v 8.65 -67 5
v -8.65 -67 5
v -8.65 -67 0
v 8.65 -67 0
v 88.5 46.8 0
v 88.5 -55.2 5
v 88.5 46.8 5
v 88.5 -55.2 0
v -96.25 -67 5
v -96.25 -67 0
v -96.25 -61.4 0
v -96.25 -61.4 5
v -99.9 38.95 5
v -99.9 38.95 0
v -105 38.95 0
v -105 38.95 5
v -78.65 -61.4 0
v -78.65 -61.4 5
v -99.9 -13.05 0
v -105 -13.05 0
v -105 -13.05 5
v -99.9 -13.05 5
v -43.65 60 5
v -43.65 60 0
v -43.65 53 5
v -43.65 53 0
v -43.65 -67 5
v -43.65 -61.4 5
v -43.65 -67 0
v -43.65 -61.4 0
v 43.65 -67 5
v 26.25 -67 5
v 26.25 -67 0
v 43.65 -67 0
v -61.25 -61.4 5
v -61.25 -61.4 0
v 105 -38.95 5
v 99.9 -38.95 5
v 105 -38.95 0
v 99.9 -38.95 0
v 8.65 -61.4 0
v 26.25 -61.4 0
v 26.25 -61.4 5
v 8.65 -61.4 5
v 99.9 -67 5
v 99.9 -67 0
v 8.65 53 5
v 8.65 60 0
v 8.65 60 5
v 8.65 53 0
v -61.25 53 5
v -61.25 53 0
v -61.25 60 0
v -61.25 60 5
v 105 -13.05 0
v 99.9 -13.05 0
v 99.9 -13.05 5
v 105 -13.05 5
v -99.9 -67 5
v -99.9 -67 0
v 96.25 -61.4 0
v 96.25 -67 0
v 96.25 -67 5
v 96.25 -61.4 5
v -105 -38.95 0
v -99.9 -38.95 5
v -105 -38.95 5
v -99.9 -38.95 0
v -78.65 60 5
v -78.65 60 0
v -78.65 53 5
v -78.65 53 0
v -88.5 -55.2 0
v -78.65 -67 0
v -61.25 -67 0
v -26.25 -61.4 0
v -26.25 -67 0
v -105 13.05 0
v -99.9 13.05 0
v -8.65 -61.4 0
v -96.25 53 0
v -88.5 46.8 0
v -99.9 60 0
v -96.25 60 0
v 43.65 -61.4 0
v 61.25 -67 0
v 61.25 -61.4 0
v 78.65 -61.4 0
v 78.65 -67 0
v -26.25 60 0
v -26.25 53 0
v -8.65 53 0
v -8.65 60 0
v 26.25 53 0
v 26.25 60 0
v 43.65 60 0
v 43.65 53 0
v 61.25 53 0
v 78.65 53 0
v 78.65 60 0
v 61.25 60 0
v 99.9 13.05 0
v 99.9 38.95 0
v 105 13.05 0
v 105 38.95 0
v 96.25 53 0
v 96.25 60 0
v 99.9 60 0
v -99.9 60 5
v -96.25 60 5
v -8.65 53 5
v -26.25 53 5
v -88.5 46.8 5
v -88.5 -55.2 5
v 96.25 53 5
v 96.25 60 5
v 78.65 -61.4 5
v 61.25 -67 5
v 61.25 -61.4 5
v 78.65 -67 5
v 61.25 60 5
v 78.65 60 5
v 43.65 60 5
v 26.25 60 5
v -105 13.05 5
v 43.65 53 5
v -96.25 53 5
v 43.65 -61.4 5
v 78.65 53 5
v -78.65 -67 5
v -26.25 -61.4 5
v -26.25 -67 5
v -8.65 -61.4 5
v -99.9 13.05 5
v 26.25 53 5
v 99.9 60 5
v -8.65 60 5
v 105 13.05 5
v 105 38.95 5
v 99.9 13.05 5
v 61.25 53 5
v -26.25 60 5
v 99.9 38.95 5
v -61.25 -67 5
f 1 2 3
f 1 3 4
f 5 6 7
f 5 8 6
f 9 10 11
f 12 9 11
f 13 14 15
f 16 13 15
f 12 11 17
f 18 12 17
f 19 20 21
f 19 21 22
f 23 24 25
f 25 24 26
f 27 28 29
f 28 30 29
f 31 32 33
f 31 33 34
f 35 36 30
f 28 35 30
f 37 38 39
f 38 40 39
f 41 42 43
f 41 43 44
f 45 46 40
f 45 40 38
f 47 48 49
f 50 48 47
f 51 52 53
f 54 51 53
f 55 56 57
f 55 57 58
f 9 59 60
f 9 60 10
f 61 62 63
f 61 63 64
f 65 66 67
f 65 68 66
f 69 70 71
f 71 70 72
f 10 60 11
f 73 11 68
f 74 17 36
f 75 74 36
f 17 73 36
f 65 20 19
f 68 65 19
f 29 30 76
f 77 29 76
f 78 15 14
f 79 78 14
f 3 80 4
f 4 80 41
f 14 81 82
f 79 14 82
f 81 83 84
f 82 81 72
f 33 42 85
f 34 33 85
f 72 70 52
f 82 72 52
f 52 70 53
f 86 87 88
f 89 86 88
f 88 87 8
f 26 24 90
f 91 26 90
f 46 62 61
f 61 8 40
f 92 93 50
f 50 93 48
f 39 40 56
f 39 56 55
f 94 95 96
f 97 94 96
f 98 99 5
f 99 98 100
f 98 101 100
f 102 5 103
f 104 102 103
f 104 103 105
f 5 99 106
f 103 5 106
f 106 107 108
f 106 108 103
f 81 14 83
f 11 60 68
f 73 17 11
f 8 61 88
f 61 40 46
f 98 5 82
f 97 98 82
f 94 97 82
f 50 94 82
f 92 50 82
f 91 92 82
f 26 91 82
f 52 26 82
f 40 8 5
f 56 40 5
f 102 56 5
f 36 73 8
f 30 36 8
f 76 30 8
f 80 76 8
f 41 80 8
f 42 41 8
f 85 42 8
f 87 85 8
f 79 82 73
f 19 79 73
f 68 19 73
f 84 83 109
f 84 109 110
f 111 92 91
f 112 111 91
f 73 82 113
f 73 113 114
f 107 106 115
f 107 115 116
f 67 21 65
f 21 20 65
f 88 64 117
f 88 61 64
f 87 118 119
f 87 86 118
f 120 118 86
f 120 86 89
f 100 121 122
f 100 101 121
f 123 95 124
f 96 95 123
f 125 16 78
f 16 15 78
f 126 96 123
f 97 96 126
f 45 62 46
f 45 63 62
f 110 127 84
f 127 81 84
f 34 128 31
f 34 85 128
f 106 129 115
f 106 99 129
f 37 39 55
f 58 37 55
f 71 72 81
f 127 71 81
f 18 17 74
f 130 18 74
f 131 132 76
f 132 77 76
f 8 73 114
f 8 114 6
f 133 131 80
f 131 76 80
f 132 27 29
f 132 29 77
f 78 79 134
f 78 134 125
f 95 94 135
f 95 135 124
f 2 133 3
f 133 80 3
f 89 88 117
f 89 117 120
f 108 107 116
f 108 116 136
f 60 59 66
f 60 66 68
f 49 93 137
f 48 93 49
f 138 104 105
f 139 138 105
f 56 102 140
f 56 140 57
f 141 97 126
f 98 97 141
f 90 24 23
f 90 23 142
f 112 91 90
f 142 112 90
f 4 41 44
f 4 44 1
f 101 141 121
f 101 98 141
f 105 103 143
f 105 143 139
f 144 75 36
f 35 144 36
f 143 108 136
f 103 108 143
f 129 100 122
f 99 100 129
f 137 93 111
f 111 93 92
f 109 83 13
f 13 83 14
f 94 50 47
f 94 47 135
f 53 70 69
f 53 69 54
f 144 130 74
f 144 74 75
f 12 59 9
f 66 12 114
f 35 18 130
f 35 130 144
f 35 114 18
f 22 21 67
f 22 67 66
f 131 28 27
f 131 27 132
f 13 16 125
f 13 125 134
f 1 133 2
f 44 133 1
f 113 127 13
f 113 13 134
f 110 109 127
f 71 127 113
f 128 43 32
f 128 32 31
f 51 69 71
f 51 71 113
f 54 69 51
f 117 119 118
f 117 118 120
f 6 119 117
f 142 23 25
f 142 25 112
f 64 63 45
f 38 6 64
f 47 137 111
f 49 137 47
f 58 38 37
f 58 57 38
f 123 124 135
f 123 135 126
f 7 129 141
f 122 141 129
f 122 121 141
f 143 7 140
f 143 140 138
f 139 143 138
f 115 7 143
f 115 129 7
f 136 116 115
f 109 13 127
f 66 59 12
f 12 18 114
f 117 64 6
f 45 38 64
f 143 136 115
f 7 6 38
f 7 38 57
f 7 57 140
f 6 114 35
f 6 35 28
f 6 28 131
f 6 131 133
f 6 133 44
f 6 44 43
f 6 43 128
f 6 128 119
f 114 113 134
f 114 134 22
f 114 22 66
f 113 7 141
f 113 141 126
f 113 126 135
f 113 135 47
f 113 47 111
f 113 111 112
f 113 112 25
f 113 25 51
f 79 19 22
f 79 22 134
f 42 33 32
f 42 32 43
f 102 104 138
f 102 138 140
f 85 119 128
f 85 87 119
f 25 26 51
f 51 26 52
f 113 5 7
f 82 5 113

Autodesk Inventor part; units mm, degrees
ref_plane "YZ Plane" through (0, 0, 0) normal (1, 0, 0) x (0, 1, 0)
ref_plane "XZ Plane" through (0, 0, 0) normal (0, 1, 0) x (-1, 0, 0)
ref_plane "XY Plane" through (0, 0, 0) normal (0, 0, 1) x (1, 0, 0)
sketch "Sketch1" plane through (0, 0, 0) normal (0, 0, 1) x (1, 0, 0)
  line L0 (-105, -65) -> (105, -65)
  line L1 (105, -65) -> (105, 65)
  line L2 (105, 65) -> (-105, 65)
  line L3 (-105, 65) -> (-105, -65)
  line L4 (-105, -65) -> (105, 65) construction
  line L5 (105, -65) -> (-105, 65) construction
  line L6 (-88.5, -51) -> (88.5, -51)
  line L7 (88.5, -51) -> (88.5, 51)
  line L8 (88.5, 51) -> (-88.5, 51)
  line L9 (-88.5, 51) -> (-88.5, -51)
  line L10 (-88.5, -51) -> (88.5, 51) construction
  line L11 (88.5, -51) -> (-88.5, 51) construction
  point P0 (0, 0)
  point P1 (-105, 0)
  dimension "d0" = 177
  dimension "d1" = 102
  dimension "d2" = 130
  dimension "d3" = 210
extrude "Extrusion1" add sketch "Sketch1" along normal blind 5 contours L3 L2 L1 L0 | L9 L8 L7 L6
sketch "Sketch2" plane through (0, 0, 5) normal (0, 0, 1) x (1, 0, 0)
  line L0 (-90, -50) -> (-80, -50) construction
  line L1 (-80, -50) -> (-80, 50)
  line L2 (-80, 50) -> (-90, 50) construction
  line L3 (-90, 50) -> (-90, -50)
  line L4 (-90, -50) -> (-80, 50) construction
  line L5 (-80, -50) -> (-90, 50) construction
  line L6 (-105, 65) -> (-105, -65) construction
  line L7 (-88.5, -51) -> (-88.5, 51) construction
  arc A0 (-80, 50) -> (-90, 50) centre (-85, 50) ccw
  arc A1 (-90, -50) -> (-80, -50) centre (-85, -50) ccw
  point P0 (0, 0)
  point P1 (-85, 0)
  dimension "d6" = 10
  dimension "d7" = 100
  dimension "d10" = 20
extrude "Extrusion2" [suppressed]
mirror "Mirror1" [suppressed]
sketch "Sketch3" plane through (0, 0, 0) normal (0, 0, -1) x (-1, 0, 0)
  line L0 (105, -65) -> (99.9, -65)
  line L1 (99.9, -65) -> (99.9, -38.95)
  line L2 (99.9, -38.95) -> (105, -38.95)
  line L3 (105, -38.95) -> (105, -65)
  line L4 (105, -13.05) -> (99.9, -13.05)
  line L5 (99.9, -13.05) -> (99.9, 13.05)
  line L6 (99.9, 13.05) -> (105, 13.05)
  line L7 (105, 13.05) -> (105, -13.05)
  line L8 (105, 65) -> (99.9, 65)
  line L9 (99.9, 65) -> (99.9, 38.95)
  line L10 (99.9, 38.95) -> (105, 38.95)
  line L11 (105, 38.95) -> (105, 65)
  line L12 (-105, -65) -> (-105, 65) projected
  line L13 (-105, 65) -> (-99.9, 65)
  line L14 (-99.9, 65) -> (-99.9, 38.95)
  line L15 (-99.9, 38.95) -> (-105, 38.95)
  line L16 (-105, 38.95) -> (-105, 65)
  line L17 (-105, 13.05) -> (-99.9, 13.05)
  line L18 (-99.9, 13.05) -> (-99.9, -13.05)
  line L19 (-99.9, -13.05) -> (-105, -13.05)
  line L20 (-105, -13.05) -> (-105, 13.05)
  line L21 (-105, -65) -> (-99.9, -65)
  line L22 (-99.9, -65) -> (-99.9, -38.95)
  line L23 (-99.9, -38.95) -> (-105, -38.95)
  line L24 (-105, -38.95) -> (-105, -65)
  line L25 (105, -65) -> (-105, -65) projected
  line L26 (-105, 65) -> (105, 65) projected
  point P0 (0, 0)
  point P1 (-105, 0)
  point P2 (-105, -13.05)
  dimension "d13" = 130
  dimension "d14" = 26.05
  dimension "d15" = 26.1
  dimension "d16" = 5.1
extrude "Extrusion3" cut sketch "Sketch3" against normal blind 10
sketch "Sketch4" plane through (-99.9, -65, 0) normal (0, -1, 0) x (1, 0, 0)
  line L0 (0, 5) -> (0, 0) projected
  line L1 (0, 0) -> (199.8, 0) projected
  line L2 (199.8, 0) -> (199.8, 5) projected
  line L3 (0, 5) -> (199.8, 5) projected
  point P0 (99.9, 0)
extrude "Extrusion4" add sketch "Sketch4" along normal blind 2
sketch "Sketch5" plane through (0, 0, 0) normal (0, 0, -1) x (-1, 0, 0)
  line L0 (99.9, 38.95) -> (99.9, 65) projected
  line L1 (-99.9, 65) -> (99.9, 65) projected
  line L2 (-99.9, 65) -> (-99.9, 38.95) projected
  line L3 (-99.9, 38.95) -> (-105, 38.95) projected
  line L4 (-105, 13.05) -> (-105, 38.95) projected
  line L5 (-105, 13.05) -> (-99.9, 13.05) projected
  line L6 (-99.9, 13.05) -> (-99.9, -13.05) projected
  line L7 (-99.9, -13.05) -> (-105, -13.05) projected
  line L8 (-105, -38.95) -> (-105, -13.05) projected
  line L9 (-105, -38.95) -> (-99.9, -38.95) projected
  line L10 (-99.9, -38.95) -> (-99.9, -67) projected
  line L11 (99.9, -67) -> (99.9, -38.95) projected
  line L12 (99.9, -38.95) -> (105, -38.95) projected
  line L13 (105, -13.05) -> (105, -38.95) projected
  line L14 (105, -13.05) -> (99.9, -13.05) projected
  line L15 (99.9, -13.05) -> (99.9, 13.05) projected
  line L16 (99.9, 13.05) -> (105, 13.05) projected
  line L17 (105, 38.95) -> (105, 13.05) projected
  line L18 (105, 38.95) -> (99.9, 38.95) projected
  line L19 (8.65, -67) -> (26.25, -67)
  line L20 (26.25, -67) -> (26.25, -61.4)
  line L21 (26.25, -61.4) -> (8.65, -61.4)
  line L22 (8.65, -61.4) -> (8.65, -67)
  line L23 (43.65, -61.4) -> (43.65, -67)
  line L24 (43.65, -67) -> (61.25, -67)
  line L25 (61.25, -61.4) -> (43.65, -61.4)
  line L26 (61.25, -67) -> (61.25, -61.4)
  line L27 (78.65, -61.4) -> (78.65, -67)
  line L28 (78.65, -67) -> (96.25, -67)
  line L29 (96.25, -61.4) -> (78.65, -61.4)
  line L30 (96.25, -67) -> (96.25, -61.4)
  line L31 (0, 0) -> (0, -124.7) construction
  line L32 (150.9327, -2.5) -> (-150.9327, -2.5) construction
  line L33 (-8.65, -67) -> (-26.25, -67)
  line L34 (-26.25, -67) -> (-26.25, -61.4)
  line L35 (-26.25, -61.4) -> (-8.65, -61.4)
  line L36 (-8.65, -61.4) -> (-8.65, -67)
  line L37 (-43.65, -61.4) -> (-43.65, -67)
  line L38 (-43.65, -67) -> (-61.25, -67)
  line L39 (-61.25, -61.4) -> (-43.65, -61.4)
  line L40 (-61.25, -67) -> (-61.25, -61.4)
  line L41 (-78.65, -61.4) -> (-78.65, -67)
  line L42 (-78.65, -67) -> (-96.25, -67)
  line L43 (-96.25, -61.4) -> (-78.65, -61.4)
  line L44 (-96.25, -67) -> (-96.25, -61.4)
  line L45 (99.9, -67) -> (-99.9, -67) projected
  line L46 (99.9, -67) -> (-99.9, -67) projected
  point P0 (17.45, -61.4)
  point P1 (52.45, -61.4)
  point P2 (87.45, -61.4)
  point P3 (0, -2.5)
  point P4 (-17.45, -61.4)
  point P5 (-52.45, -61.4)
  point P6 (-87.45, -61.4)
  dimension "d21" = 210
  dimension "d22" = 17.45
  dimension "d23" = 17.6
  dimension "d24" = 5.6
  dimension "d27" = 35
extrude "Extrusion5" cut sketch "Sketch5" against normal through all contours L28 L27 L29 L30 | L24 L23 L25 L26 | L44 L43 L41 L42 | L19 L22 L21 L20 | L40 L39 L37 L38 | L33 L34 L35 L36
sketch "Sketch7" plane through (0, 0, 0) normal (0, 0, -1) x (-1, 0, 0)
  line L0 (99.9, 53) -> (-99.9, 53) construction
  line L1 (8.65, 53) -> (26.25, 53)
  line L2 (26.25, 53) -> (26.25, 65)
  line L3 (26.25, 65) -> (8.65, 65)
  line L4 (8.65, 65) -> (8.65, 53)
  line L5 (43.65, 65) -> (43.65, 53)
  line L6 (43.65, 53) -> (61.25, 53)
  line L7 (61.25, 65) -> (43.65, 65)
  line L8 (61.25, 53) -> (61.25, 65)
  line L9 (78.65, 65) -> (78.65, 53)
  line L10 (78.65, 53) -> (96.25, 53)
  line L11 (96.25, 65) -> (78.65, 65)
  line L12 (96.25, 53) -> (96.25, 65)
  line L13 (99.9, 38.95) -> (99.9, 65) projected
  line L14 (-99.9, 65) -> (-99.9, 38.95) projected
  line L15 (-99.9, 65) -> (99.9, 65) projected
  line L16 (0, 0) -> (0, 28.7468) construction
  line L17 (-43.65, 65) -> (-43.65, 53)
  line L18 (-43.65, 53) -> (-61.25, 53)
  line L19 (-61.25, 65) -> (-43.65, 65)
  line L20 (-61.25, 53) -> (-61.25, 65)
  line L21 (-78.65, 65) -> (-78.65, 53)
  line L22 (-96.25, 65) -> (-78.65, 65)
  line L23 (-78.65, 53) -> (-96.25, 53)
  line L24 (-96.25, 53) -> (-96.25, 65)
  line L25 (-8.65, 53) -> (-26.25, 53)
  line L26 (-26.25, 53) -> (-26.25, 65)
  line L27 (-8.65, 65) -> (-8.65, 53)
  line L28 (-26.25, 65) -> (-8.65, 65)
  point P0 (0, 53)
  point P1 (17.45, 65)
  point P2 (52.45, 65)
  point P3 (87.45, 65)
  point P4 (-52.45, 65)
  point P5 (-87.45, 65)
  point P6 (-17.45, 65)
  dimension "d41" = 17.45
  dimension "d42" = 17.6
  dimension "d44" = 35
  dimension "d47" = 12
extrude "Extrusion7" cut sketch "Sketch7" against normal blind 10
sketch "Sketch8" plane through (0, 0, 0) normal (0, 0, -1) x (-1, 0, 0)
  line L0 (26.25, 65) -> (26.25, 53) projected
  line L1 (26.25, 53) -> (8.65, 53) projected
  line L2 (8.65, 53) -> (8.65, 65) projected
  line L3 (-8.65, 65) -> (8.65, 65) projected
  line L4 (-8.65, 65) -> (-8.65, 53) projected
  line L5 (-8.65, 53) -> (-26.25, 53) projected
  line L6 (-26.25, 53) -> (-26.25, 65) projected
  line L7 (-43.65, 65) -> (-26.25, 65) projected
  line L8 (-43.65, 65) -> (-43.65, 53) projected
  line L9 (-43.65, 53) -> (-61.25, 53) projected
  line L10 (-61.25, 53) -> (-61.25, 65) projected
  line L11 (-78.65, 65) -> (-61.25, 65) projected
  line L12 (-78.65, 65) -> (-78.65, 53) projected
  line L13 (-78.65, 53) -> (-96.25, 53) projected
  line L14 (-96.25, 53) -> (-96.25, 65) projected
  line L15 (-99.9, 65) -> (-96.25, 65) projected
  line L16 (-99.9, 65) -> (-99.9, 38.95) projected
  line L17 (-99.9, 38.95) -> (-105, 38.95) projected
  line L18 (-105, 13.05) -> (-105, 38.95) projected
  line L19 (-105, 13.05) -> (-99.9, 13.05) projected
  line L20 (-99.9, 13.05) -> (-99.9, -13.05) projected
  line L21 (-99.9, -13.05) -> (-105, -13.05) projected
  line L22 (-105, -38.95) -> (-105, -13.05) projected
  line L23 (-105, -38.95) -> (-99.9, -38.95) projected
  line L24 (-99.9, -38.95) -> (-99.9, -67) projected
  line L25 (-96.25, -67) -> (-99.9, -67) projected
  line L26 (-96.25, -67) -> (-96.25, -61.4) projected
  line L27 (-96.25, -61.4) -> (-78.65, -61.4) projected
  line L28 (-78.65, -61.4) -> (-78.65, -67) projected
  line L29 (-61.25, -67) -> (-78.65, -67) projected
  line L30 (-61.25, -67) -> (-61.25, -61.4) projected
  line L31 (-61.25, -61.4) -> (-43.65, -61.4) projected
  line L32 (-43.65, -61.4) -> (-43.65, -67) projected
  line L33 (-26.25, -67) -> (-43.65, -67) projected
  line L34 (-26.25, -67) -> (-26.25, -61.4) projected
  line L35 (-26.25, -61.4) -> (-8.65, -61.4) projected
  line L36 (-8.65, -61.4) -> (-8.65, -67) projected
  line L37 (8.65, -67) -> (-8.65, -67) projected
  line L38 (8.65, -67) -> (8.65, -61.4) projected
  line L39 (8.65, -61.4) -> (26.25, -61.4) projected
  line L40 (26.25, -61.4) -> (26.25, -67) projected
  line L41 (43.65, -67) -> (26.25, -67) projected
  line L42 (43.65, -67) -> (43.65, -61.4) projected
  line L43 (43.65, -61.4) -> (61.25, -61.4) projected
  line L44 (61.25, -61.4) -> (61.25, -67) projected
  line L45 (78.65, -67) -> (61.25, -67) projected
  line L46 (78.65, -67) -> (78.65, -61.4) projected
  line L47 (78.65, -61.4) -> (96.25, -61.4) projected
  line L48 (96.25, -61.4) -> (96.25, -67) projected
  line L49 (99.9, -67) -> (96.25, -67) projected
  line L50 (99.9, -67) -> (99.9, -38.95) projected
  line L51 (99.9, -38.95) -> (105, -38.95) projected
  line L52 (105, -13.05) -> (105, -38.95) projected
  line L53 (105, -13.05) -> (99.9, -13.05) projected
  line L54 (99.9, -13.05) -> (99.9, 13.05) projected
  line L55 (99.9, 13.05) -> (105, 13.05) projected
  line L56 (105, 38.95) -> (105, 13.05) projected
  line L57 (105, 38.95) -> (99.9, 38.95) projected
  line L58 (99.9, 38.95) -> (99.9, 65) projected
  line L59 (96.25, 65) -> (99.9, 65) projected
  line L60 (96.25, 65) -> (96.25, 53) projected
  line L61 (96.25, 53) -> (78.65, 53) projected
  line L62 (78.65, 53) -> (78.65, 65) projected
  line L63 (61.25, 65) -> (78.65, 65) projected
  line L64 (61.25, 65) -> (61.25, 53) projected
  line L65 (61.25, 53) -> (43.65, 53) projected
  line L66 (43.65, 53) -> (43.65, 65) projected
  line L67 (26.25, 65) -> (43.65, 65) projected
  line L68 (99.9, 60) -> (-99.9, 60)
  point P0 (0, 0)
  point P1 (-99.9, -62)
  point P2 (99.9, -62)
  point P3 (-98.075, -67)
  point P4 (-98.075, 65)
  point P5 (-8.65, 60)
  point P6 (8.65, 60)
  point P7 (-43.65, 60)
  point P8 (-26.25, 60)
  point P9 (-78.65, 60)
  point P10 (-61.25, 60)
  point P11 (-96.25, 60)
  point P12 (96.25, 60)
  point P13 (61.25, 60)
  point P14 (78.65, 60)
  point P15 (26.25, 60)
  point P16 (43.65, 60)
  dimension "d53" = 5
extrude "Extrusion8" cut sketch "Sketch8" against normal through all contours L67 L66 L68 L0 | L68 L4 L3 L2 | L64 L63 L62 L68 | L68 L8 L7 L6 | L60 L59 L58 L68 | L68 L12 L11 L10 | L68 L16 L15 L14
sketch "Sketch9" plane through (0, 0, 0) normal (0, 0, -1) x (-1, 0, 0)
  line L0 (88.5, -55.2) -> (-88.5, -55.2)
  line L1 (-88.5, -55.2) -> (-88.5, 46.8)
  line L2 (-88.5, 46.8) -> (88.5, 46.8)
  line L3 (88.5, 46.8) -> (88.5, -55.2)
  line L4 (88.5, -55.2) -> (-88.5, 46.8) construction
  line L5 (-88.5, -55.2) -> (88.5, 46.8) construction
  line L6 (-8.65, 60) -> (8.65, 60) projected
  line L7 (8.65, -67) -> (-8.65, -67) projected
  line L8 (8.65, 53) -> (26.25, 53) projected
  line L9 (17.45, 53) -> (-17.45, -61.4)
  line L10 (-8.65, -61.4) -> (-26.25, -61.4) projected
  point P0 (0, 0)
  point P1 (0, -4.2)
  dimension "d54" = 177
  dimension "d55" = 102
extrude "Extrusion9" cut sketch "Sketch9" against normal blind 5
equation "\"d27\" = 0.166667 * d21"
equation "\"d44\" = 0.166667 * d46"
equation "\"d46\" = 210"
properties part number "Frontplate" material "MDF Medium Density Fiberboard"
